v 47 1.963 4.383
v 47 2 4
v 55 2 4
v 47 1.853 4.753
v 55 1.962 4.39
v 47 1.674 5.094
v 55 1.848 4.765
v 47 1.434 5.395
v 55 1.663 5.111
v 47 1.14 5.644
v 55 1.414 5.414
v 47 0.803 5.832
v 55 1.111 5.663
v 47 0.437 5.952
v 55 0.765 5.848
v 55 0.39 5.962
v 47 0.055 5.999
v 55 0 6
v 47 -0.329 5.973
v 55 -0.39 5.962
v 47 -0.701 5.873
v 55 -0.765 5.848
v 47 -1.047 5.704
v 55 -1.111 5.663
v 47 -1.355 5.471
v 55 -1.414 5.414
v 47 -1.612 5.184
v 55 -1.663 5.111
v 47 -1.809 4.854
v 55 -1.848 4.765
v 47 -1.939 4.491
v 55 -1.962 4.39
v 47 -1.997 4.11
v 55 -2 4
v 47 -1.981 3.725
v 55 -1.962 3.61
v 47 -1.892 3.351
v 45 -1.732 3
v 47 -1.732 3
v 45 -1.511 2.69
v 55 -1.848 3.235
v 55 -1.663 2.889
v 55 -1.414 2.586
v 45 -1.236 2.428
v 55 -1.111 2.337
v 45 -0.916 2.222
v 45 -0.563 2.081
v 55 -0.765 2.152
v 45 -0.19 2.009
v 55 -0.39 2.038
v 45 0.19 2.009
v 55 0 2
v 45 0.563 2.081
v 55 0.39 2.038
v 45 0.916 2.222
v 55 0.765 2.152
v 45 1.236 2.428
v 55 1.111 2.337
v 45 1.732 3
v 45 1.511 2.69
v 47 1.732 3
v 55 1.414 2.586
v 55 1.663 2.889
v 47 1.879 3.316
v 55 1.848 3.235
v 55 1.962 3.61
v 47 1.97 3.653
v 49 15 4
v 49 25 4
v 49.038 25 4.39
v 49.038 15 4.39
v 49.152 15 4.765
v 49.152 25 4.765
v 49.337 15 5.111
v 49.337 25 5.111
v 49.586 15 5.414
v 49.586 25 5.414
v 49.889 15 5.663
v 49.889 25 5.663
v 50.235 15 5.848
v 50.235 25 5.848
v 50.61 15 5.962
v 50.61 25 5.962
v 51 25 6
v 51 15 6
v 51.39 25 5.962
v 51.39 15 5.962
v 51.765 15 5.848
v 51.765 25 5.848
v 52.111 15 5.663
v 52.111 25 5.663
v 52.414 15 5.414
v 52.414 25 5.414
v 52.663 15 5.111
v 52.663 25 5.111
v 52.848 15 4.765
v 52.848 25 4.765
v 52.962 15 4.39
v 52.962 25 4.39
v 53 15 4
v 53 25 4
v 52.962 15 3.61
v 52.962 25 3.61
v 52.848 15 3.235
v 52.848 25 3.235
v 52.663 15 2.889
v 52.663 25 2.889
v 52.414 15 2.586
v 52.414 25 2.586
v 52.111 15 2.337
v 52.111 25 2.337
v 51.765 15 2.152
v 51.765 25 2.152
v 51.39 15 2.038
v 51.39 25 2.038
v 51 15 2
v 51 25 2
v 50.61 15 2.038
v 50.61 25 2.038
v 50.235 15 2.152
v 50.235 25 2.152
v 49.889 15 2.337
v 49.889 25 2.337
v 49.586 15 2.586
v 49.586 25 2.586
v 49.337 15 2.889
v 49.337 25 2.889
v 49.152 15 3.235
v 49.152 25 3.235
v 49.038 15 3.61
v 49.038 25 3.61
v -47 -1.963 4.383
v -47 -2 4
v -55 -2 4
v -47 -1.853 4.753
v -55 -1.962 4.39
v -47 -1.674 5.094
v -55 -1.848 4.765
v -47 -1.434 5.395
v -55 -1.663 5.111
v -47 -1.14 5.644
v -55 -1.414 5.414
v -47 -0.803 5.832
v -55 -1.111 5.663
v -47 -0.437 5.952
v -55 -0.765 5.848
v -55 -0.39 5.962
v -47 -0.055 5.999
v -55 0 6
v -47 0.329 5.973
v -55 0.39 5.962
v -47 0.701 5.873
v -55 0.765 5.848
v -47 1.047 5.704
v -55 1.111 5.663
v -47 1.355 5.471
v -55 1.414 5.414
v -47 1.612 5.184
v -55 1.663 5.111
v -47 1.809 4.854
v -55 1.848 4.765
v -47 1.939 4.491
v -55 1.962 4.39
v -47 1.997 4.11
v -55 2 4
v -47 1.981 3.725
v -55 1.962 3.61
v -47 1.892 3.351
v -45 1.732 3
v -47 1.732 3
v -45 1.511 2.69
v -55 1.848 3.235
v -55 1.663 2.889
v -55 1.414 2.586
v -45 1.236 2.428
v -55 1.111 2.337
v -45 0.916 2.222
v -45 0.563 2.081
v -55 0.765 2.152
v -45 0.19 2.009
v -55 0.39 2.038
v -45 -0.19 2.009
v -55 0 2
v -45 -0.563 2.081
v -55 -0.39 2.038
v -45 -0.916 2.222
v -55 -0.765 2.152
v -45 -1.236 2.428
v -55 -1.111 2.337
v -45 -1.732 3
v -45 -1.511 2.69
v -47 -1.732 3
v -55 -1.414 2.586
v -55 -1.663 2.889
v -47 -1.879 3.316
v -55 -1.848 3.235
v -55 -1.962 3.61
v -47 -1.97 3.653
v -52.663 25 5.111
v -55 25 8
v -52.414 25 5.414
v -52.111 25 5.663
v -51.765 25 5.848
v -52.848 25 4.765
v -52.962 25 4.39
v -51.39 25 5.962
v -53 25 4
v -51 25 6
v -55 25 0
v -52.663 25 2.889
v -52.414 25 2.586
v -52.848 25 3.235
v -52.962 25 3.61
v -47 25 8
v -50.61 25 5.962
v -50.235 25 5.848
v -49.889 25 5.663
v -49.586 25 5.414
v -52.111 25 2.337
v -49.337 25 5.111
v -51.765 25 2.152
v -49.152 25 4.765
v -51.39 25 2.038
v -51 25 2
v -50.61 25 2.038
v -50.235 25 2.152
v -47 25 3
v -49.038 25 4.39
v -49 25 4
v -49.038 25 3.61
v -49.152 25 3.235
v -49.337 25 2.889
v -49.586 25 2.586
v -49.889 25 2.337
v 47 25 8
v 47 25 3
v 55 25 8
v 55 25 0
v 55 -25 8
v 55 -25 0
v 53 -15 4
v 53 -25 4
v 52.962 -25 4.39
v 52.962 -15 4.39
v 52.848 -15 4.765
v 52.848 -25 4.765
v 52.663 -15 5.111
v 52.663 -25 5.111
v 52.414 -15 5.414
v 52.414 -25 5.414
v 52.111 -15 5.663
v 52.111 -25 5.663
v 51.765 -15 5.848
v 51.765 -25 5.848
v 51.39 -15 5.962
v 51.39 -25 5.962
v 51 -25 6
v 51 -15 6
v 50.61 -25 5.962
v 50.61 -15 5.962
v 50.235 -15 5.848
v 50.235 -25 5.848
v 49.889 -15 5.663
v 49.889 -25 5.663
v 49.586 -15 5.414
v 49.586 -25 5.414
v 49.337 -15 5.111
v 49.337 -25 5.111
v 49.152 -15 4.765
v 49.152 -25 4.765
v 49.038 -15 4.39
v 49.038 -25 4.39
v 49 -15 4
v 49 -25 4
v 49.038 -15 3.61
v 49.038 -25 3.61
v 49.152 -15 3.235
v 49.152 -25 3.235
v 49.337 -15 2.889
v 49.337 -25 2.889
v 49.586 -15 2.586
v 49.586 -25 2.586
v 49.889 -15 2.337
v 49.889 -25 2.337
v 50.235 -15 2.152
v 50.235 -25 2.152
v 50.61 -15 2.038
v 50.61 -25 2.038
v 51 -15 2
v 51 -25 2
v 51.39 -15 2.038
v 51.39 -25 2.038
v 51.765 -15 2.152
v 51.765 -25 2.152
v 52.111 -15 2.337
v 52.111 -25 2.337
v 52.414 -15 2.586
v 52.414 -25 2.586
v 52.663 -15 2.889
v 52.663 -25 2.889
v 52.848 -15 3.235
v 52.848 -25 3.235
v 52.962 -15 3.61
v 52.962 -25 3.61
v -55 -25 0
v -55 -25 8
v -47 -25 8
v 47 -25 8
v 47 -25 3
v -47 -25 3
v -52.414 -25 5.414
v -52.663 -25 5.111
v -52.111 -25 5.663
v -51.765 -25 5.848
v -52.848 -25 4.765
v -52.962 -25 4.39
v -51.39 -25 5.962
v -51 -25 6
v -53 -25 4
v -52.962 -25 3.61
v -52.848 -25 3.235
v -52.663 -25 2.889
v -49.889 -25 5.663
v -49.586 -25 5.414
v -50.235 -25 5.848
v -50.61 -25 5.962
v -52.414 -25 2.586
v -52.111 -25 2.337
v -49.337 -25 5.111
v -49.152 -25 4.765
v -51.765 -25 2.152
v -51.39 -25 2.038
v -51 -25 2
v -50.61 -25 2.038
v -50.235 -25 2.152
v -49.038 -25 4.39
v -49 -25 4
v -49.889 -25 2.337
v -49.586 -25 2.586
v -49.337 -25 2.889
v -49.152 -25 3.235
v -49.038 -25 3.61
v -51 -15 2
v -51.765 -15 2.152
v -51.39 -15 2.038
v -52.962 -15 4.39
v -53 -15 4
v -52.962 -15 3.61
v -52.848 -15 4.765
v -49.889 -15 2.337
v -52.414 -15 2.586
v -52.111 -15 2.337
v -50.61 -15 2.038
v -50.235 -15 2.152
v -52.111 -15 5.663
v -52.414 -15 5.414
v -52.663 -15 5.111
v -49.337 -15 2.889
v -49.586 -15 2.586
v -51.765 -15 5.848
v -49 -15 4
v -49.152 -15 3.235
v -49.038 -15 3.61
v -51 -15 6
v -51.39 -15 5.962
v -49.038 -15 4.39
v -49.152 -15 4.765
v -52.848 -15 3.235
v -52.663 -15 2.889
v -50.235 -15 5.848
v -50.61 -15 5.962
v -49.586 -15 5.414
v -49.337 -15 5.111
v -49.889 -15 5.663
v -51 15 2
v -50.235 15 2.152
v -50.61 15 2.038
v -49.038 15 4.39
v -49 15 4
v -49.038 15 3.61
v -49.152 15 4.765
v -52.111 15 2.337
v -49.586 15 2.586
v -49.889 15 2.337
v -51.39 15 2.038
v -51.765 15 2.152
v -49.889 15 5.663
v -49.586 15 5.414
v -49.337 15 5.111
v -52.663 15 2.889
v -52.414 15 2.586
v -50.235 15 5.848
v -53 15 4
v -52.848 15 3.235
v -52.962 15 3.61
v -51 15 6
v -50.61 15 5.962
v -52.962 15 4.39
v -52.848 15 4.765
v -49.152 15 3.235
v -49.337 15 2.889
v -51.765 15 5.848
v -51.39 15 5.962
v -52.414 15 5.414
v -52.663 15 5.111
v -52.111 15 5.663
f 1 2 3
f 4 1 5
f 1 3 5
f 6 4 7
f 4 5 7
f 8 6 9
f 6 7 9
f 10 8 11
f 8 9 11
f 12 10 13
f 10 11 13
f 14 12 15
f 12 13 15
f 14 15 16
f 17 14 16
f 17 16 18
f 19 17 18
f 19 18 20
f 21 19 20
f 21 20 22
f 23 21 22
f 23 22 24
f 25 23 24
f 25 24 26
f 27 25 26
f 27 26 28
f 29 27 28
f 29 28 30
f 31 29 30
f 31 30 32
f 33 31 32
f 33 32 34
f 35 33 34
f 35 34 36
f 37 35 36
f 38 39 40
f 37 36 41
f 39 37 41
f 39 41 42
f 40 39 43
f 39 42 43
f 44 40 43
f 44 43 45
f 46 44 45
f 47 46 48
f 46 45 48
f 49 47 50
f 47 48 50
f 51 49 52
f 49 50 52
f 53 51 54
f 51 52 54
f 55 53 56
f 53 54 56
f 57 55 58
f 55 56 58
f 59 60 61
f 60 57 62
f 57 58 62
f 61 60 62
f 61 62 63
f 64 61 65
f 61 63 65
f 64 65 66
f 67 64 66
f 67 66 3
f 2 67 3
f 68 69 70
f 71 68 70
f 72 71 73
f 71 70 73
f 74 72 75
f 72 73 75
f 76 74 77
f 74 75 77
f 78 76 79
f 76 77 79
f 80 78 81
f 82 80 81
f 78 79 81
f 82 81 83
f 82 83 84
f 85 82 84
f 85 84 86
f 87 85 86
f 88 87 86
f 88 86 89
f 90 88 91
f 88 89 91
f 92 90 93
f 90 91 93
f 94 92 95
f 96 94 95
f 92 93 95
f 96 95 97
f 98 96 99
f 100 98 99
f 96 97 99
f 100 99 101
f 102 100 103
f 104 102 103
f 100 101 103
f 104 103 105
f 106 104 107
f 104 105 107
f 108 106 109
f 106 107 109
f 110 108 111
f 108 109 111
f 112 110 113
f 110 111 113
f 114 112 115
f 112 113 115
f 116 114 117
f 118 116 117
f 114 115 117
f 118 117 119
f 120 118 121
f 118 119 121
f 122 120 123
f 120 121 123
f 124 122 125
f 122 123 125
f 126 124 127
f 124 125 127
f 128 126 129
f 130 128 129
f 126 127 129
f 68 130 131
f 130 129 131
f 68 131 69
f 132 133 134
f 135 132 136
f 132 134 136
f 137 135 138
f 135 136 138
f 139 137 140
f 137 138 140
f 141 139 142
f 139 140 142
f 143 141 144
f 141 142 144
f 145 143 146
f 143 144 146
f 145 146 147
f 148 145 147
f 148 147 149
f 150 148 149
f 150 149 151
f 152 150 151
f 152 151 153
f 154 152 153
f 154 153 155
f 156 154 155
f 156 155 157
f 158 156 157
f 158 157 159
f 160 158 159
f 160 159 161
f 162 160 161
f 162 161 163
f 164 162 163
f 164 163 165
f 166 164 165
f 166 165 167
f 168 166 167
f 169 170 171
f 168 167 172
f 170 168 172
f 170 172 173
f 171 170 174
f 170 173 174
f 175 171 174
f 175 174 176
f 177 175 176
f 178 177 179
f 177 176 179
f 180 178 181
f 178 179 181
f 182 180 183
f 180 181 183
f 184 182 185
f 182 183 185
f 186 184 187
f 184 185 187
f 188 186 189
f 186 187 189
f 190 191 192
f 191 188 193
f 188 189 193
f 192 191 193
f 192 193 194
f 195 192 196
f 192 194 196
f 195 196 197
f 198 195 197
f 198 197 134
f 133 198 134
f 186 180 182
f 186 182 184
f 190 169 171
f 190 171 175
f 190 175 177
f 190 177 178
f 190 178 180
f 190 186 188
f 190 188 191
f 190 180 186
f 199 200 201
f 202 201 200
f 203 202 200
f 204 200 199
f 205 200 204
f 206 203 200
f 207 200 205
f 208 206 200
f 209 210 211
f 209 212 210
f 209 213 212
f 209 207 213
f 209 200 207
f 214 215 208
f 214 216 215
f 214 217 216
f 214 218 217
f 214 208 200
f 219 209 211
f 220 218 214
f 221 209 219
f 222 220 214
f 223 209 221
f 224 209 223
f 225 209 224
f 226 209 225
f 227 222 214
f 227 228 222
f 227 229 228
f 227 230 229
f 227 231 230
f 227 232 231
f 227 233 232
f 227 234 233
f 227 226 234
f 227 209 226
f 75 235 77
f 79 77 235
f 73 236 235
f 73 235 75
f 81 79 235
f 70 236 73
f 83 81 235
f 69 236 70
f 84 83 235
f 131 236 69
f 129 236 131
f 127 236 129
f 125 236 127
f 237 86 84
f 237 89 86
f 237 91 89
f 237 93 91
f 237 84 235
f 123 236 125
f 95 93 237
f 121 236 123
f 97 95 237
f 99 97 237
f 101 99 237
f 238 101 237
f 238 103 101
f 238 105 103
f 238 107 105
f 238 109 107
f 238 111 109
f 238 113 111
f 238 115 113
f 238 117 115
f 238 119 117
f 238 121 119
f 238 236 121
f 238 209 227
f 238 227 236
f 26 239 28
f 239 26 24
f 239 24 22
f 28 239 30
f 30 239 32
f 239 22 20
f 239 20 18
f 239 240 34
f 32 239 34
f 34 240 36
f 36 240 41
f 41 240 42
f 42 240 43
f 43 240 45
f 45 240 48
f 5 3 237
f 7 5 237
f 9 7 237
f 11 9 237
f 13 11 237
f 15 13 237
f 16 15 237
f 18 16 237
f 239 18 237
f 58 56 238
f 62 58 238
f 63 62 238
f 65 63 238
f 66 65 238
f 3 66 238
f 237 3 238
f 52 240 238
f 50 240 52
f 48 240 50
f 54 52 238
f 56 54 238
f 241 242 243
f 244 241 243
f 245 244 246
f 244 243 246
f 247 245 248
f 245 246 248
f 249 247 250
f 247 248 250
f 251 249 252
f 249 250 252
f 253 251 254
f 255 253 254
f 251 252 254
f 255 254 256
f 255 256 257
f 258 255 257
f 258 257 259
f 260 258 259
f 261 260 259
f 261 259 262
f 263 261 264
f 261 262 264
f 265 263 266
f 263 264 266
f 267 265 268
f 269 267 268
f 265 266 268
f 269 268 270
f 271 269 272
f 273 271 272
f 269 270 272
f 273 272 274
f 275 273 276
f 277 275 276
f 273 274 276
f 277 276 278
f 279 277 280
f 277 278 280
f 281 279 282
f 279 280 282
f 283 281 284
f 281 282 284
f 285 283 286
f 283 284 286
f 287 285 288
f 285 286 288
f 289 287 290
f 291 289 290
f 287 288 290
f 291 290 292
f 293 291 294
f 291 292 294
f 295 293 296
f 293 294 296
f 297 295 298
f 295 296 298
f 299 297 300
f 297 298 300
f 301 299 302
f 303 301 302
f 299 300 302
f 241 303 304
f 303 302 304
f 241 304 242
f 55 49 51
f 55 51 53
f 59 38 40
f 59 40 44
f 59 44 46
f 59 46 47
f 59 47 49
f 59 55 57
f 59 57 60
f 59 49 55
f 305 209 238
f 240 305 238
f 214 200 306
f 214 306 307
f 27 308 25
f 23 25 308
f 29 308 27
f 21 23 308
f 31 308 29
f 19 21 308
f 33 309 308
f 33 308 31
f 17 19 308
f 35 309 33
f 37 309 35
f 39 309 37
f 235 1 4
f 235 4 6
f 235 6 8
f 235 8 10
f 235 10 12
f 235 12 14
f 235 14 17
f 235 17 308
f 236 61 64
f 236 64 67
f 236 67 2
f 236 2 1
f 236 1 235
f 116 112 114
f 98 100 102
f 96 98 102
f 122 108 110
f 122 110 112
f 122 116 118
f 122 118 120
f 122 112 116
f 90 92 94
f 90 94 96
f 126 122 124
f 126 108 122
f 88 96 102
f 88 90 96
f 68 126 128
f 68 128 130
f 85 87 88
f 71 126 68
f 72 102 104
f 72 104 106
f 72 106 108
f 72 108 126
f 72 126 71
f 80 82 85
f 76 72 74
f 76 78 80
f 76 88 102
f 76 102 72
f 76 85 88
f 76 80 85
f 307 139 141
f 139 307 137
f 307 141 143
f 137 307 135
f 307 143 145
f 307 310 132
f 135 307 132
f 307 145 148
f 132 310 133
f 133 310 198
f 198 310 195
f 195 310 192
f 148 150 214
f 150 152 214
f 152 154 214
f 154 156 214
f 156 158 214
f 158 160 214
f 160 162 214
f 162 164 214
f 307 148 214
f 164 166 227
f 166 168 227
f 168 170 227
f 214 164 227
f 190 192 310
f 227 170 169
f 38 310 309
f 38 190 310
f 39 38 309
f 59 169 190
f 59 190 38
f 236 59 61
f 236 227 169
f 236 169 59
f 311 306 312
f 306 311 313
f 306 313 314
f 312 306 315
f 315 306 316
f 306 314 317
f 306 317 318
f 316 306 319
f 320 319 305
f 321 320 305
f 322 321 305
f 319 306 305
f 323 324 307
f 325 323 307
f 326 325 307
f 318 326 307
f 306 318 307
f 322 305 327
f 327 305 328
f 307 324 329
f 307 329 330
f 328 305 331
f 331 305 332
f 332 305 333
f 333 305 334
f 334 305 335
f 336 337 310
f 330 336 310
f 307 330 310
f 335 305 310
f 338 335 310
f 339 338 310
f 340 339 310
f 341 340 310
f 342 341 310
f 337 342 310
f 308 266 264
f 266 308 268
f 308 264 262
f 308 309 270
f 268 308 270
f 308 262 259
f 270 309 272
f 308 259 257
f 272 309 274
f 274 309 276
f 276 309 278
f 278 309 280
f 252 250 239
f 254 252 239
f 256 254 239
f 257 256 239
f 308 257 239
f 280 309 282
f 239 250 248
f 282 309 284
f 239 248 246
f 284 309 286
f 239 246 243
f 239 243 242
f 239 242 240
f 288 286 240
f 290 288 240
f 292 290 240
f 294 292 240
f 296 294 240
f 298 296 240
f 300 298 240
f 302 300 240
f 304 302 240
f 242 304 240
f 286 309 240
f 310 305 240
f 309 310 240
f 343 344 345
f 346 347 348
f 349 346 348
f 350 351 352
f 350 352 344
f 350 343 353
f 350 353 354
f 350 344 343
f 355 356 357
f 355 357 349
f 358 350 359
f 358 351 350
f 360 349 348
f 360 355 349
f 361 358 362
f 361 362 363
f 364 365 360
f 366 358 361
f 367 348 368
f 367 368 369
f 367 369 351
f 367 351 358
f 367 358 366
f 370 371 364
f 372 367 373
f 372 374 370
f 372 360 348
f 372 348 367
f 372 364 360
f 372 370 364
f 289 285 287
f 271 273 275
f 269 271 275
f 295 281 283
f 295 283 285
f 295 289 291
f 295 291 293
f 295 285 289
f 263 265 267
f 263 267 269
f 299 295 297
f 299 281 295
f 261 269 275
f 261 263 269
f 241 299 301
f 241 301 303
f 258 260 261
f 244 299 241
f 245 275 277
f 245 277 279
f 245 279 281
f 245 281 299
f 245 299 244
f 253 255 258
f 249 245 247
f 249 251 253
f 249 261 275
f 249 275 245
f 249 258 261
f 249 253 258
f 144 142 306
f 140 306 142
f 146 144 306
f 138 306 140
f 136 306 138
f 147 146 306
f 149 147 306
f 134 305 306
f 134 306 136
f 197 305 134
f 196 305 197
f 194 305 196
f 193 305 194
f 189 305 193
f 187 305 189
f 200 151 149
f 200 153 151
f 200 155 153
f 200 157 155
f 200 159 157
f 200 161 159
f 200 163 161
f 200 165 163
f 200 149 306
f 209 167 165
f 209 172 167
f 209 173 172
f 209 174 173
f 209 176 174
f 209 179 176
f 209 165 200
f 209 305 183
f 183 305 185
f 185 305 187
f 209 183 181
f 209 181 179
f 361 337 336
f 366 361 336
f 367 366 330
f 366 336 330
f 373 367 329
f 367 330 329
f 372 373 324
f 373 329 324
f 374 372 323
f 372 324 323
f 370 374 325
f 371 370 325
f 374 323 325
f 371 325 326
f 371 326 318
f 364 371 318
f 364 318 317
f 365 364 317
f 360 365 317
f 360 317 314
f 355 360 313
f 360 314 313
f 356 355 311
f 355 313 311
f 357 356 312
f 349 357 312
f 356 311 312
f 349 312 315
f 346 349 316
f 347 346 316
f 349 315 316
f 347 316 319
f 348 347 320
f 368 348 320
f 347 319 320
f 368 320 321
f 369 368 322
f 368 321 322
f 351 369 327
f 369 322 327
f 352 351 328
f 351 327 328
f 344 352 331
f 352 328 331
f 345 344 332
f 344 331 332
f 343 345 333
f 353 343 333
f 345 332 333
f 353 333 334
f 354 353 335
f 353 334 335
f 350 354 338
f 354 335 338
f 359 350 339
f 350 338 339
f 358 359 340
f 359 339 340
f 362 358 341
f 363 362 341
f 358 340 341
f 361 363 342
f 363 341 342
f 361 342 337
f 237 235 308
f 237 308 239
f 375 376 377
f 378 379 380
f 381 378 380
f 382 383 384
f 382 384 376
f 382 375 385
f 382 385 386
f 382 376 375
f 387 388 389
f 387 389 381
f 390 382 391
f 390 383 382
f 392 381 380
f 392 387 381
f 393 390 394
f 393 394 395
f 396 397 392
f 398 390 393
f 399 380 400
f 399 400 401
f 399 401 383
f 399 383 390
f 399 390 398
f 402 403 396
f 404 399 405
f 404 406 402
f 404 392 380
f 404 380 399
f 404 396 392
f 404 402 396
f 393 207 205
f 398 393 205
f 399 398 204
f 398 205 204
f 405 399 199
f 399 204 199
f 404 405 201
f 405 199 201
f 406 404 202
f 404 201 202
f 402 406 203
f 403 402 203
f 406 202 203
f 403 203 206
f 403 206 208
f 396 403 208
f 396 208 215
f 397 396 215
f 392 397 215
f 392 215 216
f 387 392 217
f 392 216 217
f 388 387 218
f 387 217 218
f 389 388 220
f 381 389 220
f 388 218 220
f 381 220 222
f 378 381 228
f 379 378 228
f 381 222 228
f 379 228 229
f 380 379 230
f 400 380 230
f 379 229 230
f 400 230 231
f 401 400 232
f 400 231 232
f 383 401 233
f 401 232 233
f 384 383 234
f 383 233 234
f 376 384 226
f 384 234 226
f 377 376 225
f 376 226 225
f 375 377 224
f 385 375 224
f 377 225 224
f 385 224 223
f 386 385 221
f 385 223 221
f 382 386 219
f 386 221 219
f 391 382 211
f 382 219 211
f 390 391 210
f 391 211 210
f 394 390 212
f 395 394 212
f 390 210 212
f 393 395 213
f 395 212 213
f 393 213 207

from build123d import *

# Parameters (mm, degrees)
SKETCH_W        = 110
SKETCH_H        = 50
PAD_DEPTH       = 3
SKETCH001_W     = 8
SKETCH001_H     = 50
PAD001_DEPTH    = 5
SKETCH002_R     = 2
POCKET_DEPTH    = 10
SKETCH003_R     = 2
POCKET001_DEPTH = 10
SKETCH004_R     = 2
POCKET002_DEPTH = 10
SKETCH005_R     = 2
POCKET003_DEPTH = 10


with BuildPart() as part:
    # Sketch → Pad (new body)
    with BuildSketch(Plane.XY):
        Rectangle(SKETCH_W, SKETCH_H)
    extrude(amount=PAD_DEPTH)

    # Sketch001 (on Face6 of Pad) → Pad001 (join)
    with BuildSketch(Plane.XY.offset(3)):
        with Locations((51, 0)):
            Rectangle(SKETCH001_W, SKETCH001_H)
        with Locations((-51, 0)):
            Rectangle(SKETCH001_W, SKETCH001_H)
    extrude(amount=PAD001_DEPTH)

    # Sketch002 (on Face5 of Pad001) → Pocket (cut)
    with BuildSketch(Plane(origin=(0, 25, 0), x_dir=(-1, 0, 0), z_dir=(0, 1, 0))):
        with Locations((51, 4)):
            Circle(SKETCH002_R)
        with Locations((-51, 4)):
            Circle(SKETCH002_R)
    extrude(amount=-POCKET_DEPTH, mode=Mode.SUBTRACT)

    # Sketch003 (on Face20 of Pocket) → Pocket001 (cut)
    with BuildSketch(Plane.XZ.offset(25)):
        with Locations((-51, 4)):
            Circle(SKETCH003_R)
        with Locations((51, 4)):
            Circle(SKETCH003_R)
    extrude(amount=-POCKET001_DEPTH, mode=Mode.SUBTRACT)

    # Sketch004 (on Face17 of Pocket001) → Pocket002 (cut)
    with BuildSketch(Plane(origin=(-55, 0, 0), x_dir=(0, -1, 0), z_dir=(-1, 0, 0))):
        with Locations((0, 4)):
            Circle(SKETCH004_R)
    extrude(amount=-POCKET002_DEPTH, mode=Mode.SUBTRACT)

    # Sketch005 (on Face11 of Pocket002) → Pocket003 (cut)
    with BuildSketch(Plane.YZ.offset(55)):
        with Locations((0, 4)):
            Circle(SKETCH005_R)
    extrude(amount=-POCKET003_DEPTH, mode=Mode.SUBTRACT)


solid = part.part
